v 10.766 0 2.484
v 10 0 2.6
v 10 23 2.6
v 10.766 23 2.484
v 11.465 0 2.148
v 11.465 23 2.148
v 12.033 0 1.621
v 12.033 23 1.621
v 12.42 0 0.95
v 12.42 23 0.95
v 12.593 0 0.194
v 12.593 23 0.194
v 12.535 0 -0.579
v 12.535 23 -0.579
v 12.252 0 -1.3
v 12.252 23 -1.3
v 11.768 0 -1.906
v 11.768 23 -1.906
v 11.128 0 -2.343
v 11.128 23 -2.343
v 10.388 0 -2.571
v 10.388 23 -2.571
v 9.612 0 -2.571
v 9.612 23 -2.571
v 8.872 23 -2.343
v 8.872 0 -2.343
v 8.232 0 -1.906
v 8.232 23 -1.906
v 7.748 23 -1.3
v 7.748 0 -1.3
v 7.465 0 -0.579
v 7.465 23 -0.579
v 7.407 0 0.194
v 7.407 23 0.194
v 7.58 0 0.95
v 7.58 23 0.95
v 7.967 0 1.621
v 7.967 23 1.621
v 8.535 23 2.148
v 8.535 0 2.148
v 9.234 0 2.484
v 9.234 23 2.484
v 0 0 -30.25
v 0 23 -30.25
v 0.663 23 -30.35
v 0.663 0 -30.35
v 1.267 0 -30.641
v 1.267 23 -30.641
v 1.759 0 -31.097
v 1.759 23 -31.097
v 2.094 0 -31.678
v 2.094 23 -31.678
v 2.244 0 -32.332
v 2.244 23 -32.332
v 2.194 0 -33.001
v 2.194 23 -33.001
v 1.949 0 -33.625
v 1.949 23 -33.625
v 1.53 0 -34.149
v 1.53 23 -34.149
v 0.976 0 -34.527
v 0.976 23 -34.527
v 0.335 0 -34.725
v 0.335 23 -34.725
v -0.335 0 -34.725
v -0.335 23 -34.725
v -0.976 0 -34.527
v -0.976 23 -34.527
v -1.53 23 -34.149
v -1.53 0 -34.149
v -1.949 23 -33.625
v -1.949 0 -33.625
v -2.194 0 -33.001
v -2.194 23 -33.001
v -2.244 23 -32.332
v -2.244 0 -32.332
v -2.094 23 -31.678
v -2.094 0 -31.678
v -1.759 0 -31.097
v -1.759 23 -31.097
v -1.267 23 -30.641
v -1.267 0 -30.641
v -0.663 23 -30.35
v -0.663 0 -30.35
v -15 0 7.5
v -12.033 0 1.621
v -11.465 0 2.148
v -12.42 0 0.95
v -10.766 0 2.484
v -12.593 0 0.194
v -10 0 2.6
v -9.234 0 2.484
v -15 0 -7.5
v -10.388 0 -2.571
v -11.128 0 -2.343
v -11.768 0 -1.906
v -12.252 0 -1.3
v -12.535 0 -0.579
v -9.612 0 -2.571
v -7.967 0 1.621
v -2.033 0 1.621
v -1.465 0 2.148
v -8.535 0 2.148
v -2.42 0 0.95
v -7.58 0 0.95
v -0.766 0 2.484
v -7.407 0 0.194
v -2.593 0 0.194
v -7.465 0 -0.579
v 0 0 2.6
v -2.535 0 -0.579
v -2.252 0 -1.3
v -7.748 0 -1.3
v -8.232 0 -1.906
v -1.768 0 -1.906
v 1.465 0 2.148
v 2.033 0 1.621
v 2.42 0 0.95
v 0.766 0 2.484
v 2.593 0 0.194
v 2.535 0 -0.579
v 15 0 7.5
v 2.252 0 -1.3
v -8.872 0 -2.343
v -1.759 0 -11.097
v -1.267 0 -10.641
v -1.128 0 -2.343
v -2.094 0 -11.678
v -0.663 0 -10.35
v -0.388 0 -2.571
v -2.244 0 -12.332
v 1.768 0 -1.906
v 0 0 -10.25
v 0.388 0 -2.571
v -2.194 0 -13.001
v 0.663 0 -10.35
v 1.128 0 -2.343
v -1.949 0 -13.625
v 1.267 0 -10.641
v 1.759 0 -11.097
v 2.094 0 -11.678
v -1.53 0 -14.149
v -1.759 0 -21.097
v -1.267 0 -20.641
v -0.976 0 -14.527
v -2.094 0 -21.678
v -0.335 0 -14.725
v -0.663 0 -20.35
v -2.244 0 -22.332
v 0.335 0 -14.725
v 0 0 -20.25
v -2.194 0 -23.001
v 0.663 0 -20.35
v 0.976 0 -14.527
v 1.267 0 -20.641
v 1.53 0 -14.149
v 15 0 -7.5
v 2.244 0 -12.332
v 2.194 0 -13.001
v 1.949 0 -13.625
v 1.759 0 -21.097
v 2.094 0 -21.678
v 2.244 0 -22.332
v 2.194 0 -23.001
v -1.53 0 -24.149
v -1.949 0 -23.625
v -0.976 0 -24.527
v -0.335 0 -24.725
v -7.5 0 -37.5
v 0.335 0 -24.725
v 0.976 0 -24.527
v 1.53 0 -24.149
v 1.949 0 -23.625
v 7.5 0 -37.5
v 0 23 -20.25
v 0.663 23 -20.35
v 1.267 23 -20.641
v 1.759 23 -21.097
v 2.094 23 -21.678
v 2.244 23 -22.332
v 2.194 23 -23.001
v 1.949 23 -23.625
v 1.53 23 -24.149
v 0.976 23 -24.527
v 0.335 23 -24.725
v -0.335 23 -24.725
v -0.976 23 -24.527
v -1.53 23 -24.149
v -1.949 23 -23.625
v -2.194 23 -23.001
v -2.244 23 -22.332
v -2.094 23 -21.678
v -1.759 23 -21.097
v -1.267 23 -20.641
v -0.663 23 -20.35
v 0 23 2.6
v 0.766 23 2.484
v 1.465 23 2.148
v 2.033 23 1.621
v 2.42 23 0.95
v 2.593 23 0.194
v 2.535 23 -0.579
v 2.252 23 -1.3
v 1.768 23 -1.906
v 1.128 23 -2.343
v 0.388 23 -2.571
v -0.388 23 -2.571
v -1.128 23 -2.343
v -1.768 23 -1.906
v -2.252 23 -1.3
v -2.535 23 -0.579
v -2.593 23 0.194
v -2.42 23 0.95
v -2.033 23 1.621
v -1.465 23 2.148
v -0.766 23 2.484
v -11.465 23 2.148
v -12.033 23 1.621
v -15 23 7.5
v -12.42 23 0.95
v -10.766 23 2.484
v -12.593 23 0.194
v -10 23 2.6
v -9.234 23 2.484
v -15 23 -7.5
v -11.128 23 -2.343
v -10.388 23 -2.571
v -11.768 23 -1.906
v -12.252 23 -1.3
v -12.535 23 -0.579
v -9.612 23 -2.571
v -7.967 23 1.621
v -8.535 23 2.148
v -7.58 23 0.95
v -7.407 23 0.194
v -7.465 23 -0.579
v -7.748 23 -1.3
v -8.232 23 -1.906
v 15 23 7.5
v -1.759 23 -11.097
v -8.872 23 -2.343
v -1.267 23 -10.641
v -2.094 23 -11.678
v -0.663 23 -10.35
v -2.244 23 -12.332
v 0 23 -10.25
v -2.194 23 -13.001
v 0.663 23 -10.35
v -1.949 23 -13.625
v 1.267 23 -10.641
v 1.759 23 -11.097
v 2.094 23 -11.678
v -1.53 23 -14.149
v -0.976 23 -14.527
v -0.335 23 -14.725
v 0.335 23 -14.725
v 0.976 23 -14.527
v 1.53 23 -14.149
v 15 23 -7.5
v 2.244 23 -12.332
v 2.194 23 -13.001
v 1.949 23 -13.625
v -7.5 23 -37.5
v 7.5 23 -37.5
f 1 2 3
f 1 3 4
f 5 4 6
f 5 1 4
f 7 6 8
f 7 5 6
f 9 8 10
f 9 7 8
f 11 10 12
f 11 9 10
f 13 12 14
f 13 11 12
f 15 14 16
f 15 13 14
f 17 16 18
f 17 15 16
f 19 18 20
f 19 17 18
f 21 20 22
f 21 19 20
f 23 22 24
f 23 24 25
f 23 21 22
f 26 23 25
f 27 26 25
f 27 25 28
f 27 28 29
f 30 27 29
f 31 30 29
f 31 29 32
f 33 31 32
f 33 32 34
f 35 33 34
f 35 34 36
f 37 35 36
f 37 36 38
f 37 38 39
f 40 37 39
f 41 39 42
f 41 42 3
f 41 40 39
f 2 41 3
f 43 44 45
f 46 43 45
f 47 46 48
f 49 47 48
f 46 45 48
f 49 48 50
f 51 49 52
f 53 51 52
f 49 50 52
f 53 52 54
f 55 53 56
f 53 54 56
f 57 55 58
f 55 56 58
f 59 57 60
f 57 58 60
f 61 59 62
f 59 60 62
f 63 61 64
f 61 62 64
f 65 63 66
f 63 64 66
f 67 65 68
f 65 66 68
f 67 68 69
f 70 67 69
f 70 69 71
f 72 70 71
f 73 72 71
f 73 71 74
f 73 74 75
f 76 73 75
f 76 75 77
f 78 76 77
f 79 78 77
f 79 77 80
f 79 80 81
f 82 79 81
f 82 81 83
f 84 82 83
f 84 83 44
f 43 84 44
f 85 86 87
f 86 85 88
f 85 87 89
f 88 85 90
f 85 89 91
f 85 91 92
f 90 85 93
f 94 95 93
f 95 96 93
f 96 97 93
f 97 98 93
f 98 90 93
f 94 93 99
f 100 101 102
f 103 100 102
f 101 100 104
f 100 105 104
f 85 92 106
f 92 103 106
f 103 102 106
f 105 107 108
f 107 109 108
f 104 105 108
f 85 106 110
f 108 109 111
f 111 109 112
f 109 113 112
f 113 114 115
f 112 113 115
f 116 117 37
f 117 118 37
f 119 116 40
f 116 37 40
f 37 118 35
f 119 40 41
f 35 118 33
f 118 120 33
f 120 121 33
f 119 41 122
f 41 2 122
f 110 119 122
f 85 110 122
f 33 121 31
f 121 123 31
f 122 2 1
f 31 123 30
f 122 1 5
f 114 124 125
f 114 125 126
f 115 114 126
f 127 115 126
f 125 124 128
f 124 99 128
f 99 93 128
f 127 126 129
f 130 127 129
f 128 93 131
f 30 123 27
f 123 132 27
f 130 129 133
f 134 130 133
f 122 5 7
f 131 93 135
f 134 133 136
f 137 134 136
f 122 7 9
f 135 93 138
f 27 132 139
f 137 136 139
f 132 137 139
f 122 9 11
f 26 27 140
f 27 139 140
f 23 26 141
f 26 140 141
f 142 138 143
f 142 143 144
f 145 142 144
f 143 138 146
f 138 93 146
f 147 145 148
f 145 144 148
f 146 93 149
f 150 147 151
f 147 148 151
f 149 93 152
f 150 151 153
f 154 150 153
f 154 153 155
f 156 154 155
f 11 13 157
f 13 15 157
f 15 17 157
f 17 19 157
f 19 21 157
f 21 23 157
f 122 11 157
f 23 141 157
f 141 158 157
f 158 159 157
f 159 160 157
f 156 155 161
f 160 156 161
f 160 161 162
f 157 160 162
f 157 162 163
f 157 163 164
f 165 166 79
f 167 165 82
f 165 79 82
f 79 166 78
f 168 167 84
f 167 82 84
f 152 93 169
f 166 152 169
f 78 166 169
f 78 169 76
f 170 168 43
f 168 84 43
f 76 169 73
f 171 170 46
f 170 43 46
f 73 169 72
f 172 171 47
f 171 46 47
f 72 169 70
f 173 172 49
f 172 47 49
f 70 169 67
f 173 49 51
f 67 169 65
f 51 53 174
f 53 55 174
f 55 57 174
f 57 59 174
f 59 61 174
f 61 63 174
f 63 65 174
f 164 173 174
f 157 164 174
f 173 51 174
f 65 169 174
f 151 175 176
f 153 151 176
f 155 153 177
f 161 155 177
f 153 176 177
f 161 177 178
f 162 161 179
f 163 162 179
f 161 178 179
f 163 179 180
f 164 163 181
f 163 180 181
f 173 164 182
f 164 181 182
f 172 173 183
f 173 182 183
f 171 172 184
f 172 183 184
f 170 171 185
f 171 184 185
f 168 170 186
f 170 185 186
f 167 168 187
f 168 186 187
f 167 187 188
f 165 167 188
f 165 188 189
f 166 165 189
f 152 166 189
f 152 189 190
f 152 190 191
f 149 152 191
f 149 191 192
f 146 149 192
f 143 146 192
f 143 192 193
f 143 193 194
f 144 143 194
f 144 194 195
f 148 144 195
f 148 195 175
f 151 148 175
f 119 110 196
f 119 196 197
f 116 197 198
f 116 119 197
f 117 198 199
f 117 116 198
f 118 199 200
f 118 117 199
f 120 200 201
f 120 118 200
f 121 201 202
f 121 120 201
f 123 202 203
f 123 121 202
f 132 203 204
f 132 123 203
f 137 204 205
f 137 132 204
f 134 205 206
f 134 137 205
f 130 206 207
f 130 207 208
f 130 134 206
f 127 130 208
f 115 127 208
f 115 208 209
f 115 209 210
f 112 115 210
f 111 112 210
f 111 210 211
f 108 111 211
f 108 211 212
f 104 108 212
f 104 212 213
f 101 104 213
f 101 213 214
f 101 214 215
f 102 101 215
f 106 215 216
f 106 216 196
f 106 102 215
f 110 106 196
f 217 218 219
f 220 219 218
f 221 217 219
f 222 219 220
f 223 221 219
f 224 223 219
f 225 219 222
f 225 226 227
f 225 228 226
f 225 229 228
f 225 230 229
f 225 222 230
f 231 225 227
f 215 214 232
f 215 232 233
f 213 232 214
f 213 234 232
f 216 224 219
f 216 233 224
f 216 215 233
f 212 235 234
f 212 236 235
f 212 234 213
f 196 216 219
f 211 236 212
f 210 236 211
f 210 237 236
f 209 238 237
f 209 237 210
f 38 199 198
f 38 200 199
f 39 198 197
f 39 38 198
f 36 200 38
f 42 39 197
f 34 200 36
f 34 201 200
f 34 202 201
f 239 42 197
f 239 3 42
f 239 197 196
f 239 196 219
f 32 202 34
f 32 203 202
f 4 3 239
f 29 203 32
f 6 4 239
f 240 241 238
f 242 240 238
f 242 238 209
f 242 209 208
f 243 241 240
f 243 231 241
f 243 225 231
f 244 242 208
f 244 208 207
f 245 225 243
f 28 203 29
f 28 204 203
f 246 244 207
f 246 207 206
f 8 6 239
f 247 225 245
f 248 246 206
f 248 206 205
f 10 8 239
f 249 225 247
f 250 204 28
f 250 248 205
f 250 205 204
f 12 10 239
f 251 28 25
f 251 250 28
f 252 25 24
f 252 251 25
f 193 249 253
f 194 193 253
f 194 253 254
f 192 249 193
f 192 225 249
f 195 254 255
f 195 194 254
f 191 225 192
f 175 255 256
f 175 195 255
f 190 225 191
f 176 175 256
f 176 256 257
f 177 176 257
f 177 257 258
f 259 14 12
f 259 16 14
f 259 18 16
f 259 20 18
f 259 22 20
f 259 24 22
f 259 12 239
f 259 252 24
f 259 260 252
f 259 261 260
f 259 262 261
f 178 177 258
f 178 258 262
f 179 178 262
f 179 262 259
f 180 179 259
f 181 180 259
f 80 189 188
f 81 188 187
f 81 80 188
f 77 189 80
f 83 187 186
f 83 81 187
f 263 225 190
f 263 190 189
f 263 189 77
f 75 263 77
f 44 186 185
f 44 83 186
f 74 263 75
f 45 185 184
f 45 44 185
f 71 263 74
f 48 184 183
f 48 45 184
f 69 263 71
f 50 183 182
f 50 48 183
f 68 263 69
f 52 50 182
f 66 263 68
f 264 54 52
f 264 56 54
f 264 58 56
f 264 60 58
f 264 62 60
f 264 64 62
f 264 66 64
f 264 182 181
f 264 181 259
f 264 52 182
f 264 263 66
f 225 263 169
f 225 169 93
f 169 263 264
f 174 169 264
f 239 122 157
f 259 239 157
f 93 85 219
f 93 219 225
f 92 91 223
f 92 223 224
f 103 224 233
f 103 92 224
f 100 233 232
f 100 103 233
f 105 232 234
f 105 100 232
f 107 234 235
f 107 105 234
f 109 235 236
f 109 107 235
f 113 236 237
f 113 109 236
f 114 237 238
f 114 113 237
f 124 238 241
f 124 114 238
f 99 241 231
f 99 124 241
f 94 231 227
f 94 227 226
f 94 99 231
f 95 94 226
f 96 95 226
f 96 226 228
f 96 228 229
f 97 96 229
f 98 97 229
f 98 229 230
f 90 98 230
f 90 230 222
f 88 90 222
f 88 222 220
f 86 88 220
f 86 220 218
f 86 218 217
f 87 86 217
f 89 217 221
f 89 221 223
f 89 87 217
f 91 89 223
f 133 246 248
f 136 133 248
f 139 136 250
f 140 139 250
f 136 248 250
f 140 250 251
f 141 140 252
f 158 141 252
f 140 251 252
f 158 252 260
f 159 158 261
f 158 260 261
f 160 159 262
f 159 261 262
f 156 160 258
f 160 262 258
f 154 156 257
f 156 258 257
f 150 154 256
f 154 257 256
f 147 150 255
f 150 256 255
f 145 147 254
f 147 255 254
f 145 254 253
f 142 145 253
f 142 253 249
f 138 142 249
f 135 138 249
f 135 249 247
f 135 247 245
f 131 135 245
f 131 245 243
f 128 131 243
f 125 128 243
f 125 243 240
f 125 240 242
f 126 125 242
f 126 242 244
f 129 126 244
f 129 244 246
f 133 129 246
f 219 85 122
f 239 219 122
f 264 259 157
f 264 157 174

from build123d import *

# Parameters (mm, degrees)
SKETCH1_W           = 30
SKETCH1_H           = 15
SKETCH1_R           = 2.6
BOSS_EXTRUDE1_DEPTH = 23
SKETCH2_W           = 15
SKETCH2_H           = 30
BOSS_EXTRUDE2_DEPTH = 23
SKETCH3_R           = 2.25
CUT_EXTRUDE1_DEPTH  = 47.478489648
BOSS_EXTRUDE3_DEPTH = 23


with BuildPart() as part:
    # Sketch1 → Boss-Extrude1 (new body)
    with BuildSketch(Plane(origin=(0, 0, 0), x_dir=(1, 0, 0), z_dir=(0, 1, 0))):
        Rectangle(SKETCH1_W, SKETCH1_H)
        with Locations(Location((0, 0, 0), (0, 0, 270))):
            Circle(SKETCH1_R, mode=Mode.SUBTRACT)
        with Locations(Location((10, 0, 0), (0, 0, 270))):
            Circle(SKETCH1_R, mode=Mode.SUBTRACT)
        with Locations(Location((-10, 0, 0), (0, 0, 270))):
            Circle(SKETCH1_R, mode=Mode.SUBTRACT)
    extrude(amount=BOSS_EXTRUDE1_DEPTH)

    # Sketch2 → Boss-Extrude2 (add)
    with BuildSketch(Plane(origin=(0, 23, 0), x_dir=(1, 0, 0), z_dir=(0, 1, 0))):
        with Locations((0, 22.5)):
            Rectangle(SKETCH2_W, SKETCH2_H)
    extrude(amount=-BOSS_EXTRUDE2_DEPTH)

    # Sketch3 → Cut-Extrude1 (cut, through all)
    with BuildSketch(Plane(origin=(0, 23, 0), x_dir=(1, 0, 0), z_dir=(0, 1, 0))):
        with Locations(Location((0, 32.5, 0), (0, 0, 270))):
            Circle(SKETCH3_R)
        with Locations(Location((0, 22.5, 0), (0, 0, 270))):
            Circle(SKETCH3_R)
        with Locations(Location((0, 12.5, 0), (0, 0, 270))):
            Circle(SKETCH3_R)
    extrude(amount=-CUT_EXTRUDE1_DEPTH, mode=Mode.SUBTRACT)

    # Sketch4 → Boss-Extrude3 (add)
    with BuildSketch(Plane(origin=(0, 23, 0), x_dir=(1, 0, 0), z_dir=(0, 1, 0))):
        Polygon((-7.5, 37.5), (-15, 7.5), (-7.5, 7.5), align=None)
        Polygon((7.5, 37.5), (7.5, 7.5), (15, 7.5), align=None)
    extrude(amount=-BOSS_EXTRUDE3_DEPTH)


solid = part.part
